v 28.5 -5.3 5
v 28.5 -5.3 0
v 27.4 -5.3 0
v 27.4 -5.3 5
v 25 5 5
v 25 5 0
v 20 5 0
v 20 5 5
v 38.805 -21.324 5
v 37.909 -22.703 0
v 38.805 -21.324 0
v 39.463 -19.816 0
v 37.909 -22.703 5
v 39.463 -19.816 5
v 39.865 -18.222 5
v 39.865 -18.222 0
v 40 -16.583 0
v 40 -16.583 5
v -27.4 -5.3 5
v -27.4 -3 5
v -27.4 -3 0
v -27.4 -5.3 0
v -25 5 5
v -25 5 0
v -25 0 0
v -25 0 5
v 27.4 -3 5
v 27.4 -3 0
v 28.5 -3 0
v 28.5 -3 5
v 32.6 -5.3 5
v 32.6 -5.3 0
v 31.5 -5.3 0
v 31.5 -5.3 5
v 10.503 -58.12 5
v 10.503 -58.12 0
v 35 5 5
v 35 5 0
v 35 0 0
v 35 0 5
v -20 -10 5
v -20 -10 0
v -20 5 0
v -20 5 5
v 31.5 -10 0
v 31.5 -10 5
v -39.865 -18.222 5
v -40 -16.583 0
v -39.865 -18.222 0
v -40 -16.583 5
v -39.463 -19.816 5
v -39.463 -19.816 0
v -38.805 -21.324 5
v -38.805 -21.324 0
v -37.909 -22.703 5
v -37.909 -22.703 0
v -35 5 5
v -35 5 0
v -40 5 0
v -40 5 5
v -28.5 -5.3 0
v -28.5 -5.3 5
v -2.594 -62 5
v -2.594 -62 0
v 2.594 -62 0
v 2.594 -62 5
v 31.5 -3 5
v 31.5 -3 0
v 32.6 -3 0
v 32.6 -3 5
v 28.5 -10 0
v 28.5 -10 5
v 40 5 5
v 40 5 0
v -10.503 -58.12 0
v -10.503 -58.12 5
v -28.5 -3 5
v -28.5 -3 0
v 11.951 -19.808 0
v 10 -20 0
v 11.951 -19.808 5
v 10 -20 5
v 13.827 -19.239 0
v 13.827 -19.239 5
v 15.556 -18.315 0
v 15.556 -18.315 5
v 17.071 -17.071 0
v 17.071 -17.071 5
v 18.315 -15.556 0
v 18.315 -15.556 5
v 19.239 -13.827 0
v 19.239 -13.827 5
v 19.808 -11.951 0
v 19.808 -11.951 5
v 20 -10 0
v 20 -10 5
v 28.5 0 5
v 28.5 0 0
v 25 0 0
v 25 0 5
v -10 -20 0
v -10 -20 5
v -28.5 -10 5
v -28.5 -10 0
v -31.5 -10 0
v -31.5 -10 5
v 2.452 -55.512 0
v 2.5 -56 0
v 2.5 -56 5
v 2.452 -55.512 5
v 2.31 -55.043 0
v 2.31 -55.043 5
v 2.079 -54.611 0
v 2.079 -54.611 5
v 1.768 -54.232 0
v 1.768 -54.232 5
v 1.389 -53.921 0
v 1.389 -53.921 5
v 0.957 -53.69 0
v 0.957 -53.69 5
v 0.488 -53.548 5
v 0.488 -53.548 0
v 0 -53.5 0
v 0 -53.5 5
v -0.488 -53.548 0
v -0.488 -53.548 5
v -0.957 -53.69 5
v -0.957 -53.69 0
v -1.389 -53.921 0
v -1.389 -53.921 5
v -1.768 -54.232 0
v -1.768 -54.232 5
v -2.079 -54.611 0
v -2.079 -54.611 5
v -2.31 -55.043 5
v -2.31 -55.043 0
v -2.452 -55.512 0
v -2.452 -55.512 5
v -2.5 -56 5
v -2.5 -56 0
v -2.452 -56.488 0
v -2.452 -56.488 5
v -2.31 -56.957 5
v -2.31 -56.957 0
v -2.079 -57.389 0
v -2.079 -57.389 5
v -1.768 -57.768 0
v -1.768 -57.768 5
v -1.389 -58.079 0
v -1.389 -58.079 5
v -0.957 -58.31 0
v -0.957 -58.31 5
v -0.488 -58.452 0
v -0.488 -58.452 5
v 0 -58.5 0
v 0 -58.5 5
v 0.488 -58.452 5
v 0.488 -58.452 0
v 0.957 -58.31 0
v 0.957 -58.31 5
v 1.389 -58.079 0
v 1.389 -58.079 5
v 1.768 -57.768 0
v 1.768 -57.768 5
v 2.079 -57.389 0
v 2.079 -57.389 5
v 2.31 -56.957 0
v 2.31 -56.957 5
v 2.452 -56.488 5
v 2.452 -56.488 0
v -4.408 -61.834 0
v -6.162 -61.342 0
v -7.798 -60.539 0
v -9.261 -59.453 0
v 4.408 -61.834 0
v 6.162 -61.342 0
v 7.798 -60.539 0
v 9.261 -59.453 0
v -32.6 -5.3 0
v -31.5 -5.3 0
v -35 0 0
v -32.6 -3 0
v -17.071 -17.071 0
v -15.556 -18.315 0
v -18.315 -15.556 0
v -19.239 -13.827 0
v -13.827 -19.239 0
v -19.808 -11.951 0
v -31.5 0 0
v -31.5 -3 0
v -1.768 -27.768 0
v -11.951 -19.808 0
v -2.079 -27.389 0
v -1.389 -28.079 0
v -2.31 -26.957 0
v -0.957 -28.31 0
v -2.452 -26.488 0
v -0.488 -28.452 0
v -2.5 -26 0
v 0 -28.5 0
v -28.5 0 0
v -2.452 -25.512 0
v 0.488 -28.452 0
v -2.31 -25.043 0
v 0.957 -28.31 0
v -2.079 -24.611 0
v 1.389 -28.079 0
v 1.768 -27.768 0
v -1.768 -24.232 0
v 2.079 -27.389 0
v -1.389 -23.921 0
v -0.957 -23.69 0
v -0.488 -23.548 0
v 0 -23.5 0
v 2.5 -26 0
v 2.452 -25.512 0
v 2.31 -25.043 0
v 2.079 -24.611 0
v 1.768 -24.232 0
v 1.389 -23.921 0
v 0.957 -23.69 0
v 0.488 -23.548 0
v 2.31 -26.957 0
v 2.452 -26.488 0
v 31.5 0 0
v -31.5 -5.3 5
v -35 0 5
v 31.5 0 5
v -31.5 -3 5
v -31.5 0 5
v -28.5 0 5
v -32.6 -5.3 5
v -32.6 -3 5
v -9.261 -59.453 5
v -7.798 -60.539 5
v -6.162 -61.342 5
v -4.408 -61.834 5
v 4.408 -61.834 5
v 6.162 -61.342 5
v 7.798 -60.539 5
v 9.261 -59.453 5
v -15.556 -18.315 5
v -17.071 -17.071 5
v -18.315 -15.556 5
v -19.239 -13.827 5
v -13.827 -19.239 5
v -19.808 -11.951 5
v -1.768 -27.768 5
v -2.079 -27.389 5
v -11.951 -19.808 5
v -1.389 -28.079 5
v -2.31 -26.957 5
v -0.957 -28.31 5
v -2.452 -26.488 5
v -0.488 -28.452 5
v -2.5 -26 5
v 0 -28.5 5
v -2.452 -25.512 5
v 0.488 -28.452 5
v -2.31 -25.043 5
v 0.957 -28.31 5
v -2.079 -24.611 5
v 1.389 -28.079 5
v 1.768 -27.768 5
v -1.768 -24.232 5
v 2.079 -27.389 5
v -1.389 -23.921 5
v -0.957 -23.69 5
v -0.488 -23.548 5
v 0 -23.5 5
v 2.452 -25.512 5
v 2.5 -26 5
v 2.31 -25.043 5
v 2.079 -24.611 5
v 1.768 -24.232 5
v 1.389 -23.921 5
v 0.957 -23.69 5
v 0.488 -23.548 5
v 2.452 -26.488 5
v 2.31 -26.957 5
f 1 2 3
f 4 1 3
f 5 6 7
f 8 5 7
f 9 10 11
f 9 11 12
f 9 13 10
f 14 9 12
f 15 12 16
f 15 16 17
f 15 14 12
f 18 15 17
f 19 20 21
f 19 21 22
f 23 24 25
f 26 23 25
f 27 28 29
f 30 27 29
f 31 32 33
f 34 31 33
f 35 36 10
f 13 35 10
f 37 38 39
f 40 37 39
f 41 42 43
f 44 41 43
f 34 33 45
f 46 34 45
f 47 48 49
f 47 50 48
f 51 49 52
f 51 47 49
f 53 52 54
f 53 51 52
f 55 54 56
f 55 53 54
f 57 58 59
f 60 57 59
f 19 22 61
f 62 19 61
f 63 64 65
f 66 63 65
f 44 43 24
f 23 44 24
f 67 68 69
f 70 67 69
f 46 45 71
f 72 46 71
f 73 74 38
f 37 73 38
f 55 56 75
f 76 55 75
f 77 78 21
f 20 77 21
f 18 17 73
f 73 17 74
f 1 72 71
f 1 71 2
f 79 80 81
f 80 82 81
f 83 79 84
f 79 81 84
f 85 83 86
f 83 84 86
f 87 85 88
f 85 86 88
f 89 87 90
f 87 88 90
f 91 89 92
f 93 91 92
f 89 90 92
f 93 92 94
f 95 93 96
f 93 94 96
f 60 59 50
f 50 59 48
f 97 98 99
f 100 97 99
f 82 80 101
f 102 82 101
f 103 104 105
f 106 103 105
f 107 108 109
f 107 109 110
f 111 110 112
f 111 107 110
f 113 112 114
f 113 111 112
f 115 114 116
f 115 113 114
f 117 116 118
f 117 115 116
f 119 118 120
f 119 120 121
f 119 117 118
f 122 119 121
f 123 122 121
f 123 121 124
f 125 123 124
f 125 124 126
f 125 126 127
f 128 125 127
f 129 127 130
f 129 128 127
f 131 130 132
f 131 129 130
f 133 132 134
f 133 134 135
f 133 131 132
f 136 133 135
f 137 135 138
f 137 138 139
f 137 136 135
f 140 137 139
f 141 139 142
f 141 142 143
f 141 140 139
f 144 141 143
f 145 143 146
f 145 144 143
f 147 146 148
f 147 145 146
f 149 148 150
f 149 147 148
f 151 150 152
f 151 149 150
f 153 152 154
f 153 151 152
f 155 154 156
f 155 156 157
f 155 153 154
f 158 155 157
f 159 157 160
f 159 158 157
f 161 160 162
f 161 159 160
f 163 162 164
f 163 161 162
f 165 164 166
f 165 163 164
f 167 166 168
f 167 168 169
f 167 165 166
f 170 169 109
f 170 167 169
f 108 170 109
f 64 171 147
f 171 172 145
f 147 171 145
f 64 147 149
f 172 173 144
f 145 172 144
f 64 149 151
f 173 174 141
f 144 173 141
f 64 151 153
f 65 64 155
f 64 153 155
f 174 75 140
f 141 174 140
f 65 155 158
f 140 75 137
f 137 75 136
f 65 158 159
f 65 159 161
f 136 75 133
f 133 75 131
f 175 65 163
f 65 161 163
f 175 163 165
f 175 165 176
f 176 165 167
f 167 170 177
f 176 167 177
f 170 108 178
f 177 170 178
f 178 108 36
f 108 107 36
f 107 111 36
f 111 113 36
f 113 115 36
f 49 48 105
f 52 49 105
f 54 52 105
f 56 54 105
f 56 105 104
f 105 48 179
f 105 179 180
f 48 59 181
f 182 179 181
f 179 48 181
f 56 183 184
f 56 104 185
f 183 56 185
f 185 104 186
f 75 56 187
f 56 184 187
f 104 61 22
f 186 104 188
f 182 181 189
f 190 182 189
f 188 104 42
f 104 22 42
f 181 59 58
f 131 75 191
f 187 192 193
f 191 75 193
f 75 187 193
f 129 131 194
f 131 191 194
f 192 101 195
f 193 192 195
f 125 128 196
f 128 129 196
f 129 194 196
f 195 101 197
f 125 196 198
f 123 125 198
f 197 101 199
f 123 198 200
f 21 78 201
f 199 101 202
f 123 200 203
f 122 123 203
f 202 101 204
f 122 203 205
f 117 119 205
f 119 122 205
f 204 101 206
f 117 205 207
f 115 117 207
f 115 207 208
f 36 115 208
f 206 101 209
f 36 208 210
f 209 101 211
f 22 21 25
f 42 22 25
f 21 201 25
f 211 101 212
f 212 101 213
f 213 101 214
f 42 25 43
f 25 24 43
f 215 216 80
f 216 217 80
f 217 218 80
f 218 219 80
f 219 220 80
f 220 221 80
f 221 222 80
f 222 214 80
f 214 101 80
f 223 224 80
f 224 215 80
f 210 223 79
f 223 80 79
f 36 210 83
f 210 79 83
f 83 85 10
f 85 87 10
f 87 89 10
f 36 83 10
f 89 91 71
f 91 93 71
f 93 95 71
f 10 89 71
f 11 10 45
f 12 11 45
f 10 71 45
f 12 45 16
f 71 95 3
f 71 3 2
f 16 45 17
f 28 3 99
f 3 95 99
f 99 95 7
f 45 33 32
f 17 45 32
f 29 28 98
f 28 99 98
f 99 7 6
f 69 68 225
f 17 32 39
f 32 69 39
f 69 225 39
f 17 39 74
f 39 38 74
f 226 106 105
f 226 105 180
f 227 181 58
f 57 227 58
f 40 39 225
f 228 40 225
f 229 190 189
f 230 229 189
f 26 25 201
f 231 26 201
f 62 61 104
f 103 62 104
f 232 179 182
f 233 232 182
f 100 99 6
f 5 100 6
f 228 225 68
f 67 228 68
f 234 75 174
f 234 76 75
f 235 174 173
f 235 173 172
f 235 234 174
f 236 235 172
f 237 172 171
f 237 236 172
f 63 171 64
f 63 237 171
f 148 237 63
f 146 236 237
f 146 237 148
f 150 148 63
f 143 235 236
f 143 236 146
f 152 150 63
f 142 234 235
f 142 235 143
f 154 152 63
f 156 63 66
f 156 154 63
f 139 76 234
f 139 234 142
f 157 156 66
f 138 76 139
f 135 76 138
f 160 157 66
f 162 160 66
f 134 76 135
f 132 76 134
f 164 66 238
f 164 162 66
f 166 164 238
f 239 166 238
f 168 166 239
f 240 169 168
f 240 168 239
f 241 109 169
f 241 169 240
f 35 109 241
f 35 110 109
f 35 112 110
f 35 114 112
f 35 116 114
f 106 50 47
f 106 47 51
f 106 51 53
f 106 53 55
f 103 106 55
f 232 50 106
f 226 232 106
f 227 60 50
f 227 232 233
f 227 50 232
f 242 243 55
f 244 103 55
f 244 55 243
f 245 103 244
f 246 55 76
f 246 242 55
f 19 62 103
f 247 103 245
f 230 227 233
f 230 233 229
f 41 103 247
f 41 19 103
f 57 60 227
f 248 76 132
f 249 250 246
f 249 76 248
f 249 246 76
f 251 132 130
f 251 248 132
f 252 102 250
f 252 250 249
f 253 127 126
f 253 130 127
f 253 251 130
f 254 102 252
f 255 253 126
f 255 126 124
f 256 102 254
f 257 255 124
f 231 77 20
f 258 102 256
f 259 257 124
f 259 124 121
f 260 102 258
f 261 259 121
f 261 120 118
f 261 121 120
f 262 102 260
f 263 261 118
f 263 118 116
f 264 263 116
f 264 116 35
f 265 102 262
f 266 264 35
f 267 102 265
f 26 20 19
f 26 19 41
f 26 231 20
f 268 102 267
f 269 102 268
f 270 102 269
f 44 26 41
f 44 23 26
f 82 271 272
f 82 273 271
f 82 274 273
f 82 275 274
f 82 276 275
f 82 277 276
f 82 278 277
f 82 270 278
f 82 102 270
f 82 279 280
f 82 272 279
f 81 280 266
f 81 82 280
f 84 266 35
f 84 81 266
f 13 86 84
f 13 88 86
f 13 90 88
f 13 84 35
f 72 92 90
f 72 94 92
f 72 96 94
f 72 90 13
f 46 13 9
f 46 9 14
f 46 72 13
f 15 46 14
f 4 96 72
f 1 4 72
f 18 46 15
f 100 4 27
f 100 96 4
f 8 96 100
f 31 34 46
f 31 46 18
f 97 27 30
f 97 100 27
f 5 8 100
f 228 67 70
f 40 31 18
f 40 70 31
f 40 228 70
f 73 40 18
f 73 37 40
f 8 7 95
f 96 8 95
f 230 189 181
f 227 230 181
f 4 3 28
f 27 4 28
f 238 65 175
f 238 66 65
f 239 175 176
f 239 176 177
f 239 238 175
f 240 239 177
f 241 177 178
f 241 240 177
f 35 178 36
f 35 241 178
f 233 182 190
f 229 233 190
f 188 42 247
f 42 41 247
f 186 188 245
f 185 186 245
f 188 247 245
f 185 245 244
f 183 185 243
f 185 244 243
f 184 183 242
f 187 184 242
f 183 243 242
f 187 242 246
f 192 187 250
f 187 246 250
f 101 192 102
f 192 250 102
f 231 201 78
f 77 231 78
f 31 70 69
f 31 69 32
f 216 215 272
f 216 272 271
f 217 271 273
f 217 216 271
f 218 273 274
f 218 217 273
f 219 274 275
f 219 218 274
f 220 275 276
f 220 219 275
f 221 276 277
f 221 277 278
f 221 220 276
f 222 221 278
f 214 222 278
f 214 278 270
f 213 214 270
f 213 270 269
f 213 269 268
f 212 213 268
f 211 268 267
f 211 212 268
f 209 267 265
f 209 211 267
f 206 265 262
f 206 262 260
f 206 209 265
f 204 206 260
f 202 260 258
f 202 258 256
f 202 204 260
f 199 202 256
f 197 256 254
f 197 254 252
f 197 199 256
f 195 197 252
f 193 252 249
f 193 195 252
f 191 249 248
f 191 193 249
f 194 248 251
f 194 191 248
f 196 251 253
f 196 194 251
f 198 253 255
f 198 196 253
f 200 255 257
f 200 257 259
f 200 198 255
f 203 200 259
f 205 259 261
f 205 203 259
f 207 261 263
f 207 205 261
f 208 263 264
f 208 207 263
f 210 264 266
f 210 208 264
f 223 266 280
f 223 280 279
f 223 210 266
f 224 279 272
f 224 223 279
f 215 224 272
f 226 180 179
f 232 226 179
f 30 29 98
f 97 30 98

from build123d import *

# Parameters (mm, degrees)
ESQUISSE1_R        = 2.5
BOSS_EXTRU_1_DEPTH = 5
CONG_1_R           = 10


with BuildPart() as part:
    # Esquisse1 → Boss.-Extru.1 (new body)
    with BuildSketch(Plane.XY):
        Polygon((-40, 5), (-40, 0), (-40, -20), (-7.5, -62), (7.5, -62), (40, -20), (40, 0), (40, 5), (35, 5), (35, 0), (31.5, 0), (31.5, -3), (32.6, -3), (32.6, -5.3), (31.5, -5.3), (31.5, -10), (28.5, -10), (28.5, -5.3), (27.4, -5.3), (27.4, -3), (28.5, -3), (28.5, 0), (25, 0), (25, 5), (20, 5), (20, 0), (20, -20), (-20, -20), (-20, 0), (-20, 5), (-25, 5), (-25, 0), (-28.5, 0), (-28.5, -3), (-27.4, -3), (-27.4, -5.3), (-28.5, -5.3), (-28.5, -10), (-31.5, -10), (-31.5, -5.3), (-32.6, -5.3), (-32.6, -3), (-31.5, -3), (-31.5, 0), (-35, 0), (-35, 5), align=None)
        with Locations((0, -56)):
            Circle(ESQUISSE1_R, mode=Mode.SUBTRACT)
        with Locations((0, -26)):
            Circle(ESQUISSE1_R, mode=Mode.SUBTRACT)
    extrude(amount=BOSS_EXTRU_1_DEPTH)

    # Congé1
    cong_1_edges = [part.edges().sort_by_distance(p)[0] for p in [
        (-20, -20, 2.5),
        (20, -20, 2.5),
        (40, -20, 2.5),
        (7.5, -62, 2.5),
        (-7.5, -62, 2.5),
        (-40, -20, 2.5),
    ]]
    fillet(cong_1_edges, radius=CONG_1_R)


solid = part.part
